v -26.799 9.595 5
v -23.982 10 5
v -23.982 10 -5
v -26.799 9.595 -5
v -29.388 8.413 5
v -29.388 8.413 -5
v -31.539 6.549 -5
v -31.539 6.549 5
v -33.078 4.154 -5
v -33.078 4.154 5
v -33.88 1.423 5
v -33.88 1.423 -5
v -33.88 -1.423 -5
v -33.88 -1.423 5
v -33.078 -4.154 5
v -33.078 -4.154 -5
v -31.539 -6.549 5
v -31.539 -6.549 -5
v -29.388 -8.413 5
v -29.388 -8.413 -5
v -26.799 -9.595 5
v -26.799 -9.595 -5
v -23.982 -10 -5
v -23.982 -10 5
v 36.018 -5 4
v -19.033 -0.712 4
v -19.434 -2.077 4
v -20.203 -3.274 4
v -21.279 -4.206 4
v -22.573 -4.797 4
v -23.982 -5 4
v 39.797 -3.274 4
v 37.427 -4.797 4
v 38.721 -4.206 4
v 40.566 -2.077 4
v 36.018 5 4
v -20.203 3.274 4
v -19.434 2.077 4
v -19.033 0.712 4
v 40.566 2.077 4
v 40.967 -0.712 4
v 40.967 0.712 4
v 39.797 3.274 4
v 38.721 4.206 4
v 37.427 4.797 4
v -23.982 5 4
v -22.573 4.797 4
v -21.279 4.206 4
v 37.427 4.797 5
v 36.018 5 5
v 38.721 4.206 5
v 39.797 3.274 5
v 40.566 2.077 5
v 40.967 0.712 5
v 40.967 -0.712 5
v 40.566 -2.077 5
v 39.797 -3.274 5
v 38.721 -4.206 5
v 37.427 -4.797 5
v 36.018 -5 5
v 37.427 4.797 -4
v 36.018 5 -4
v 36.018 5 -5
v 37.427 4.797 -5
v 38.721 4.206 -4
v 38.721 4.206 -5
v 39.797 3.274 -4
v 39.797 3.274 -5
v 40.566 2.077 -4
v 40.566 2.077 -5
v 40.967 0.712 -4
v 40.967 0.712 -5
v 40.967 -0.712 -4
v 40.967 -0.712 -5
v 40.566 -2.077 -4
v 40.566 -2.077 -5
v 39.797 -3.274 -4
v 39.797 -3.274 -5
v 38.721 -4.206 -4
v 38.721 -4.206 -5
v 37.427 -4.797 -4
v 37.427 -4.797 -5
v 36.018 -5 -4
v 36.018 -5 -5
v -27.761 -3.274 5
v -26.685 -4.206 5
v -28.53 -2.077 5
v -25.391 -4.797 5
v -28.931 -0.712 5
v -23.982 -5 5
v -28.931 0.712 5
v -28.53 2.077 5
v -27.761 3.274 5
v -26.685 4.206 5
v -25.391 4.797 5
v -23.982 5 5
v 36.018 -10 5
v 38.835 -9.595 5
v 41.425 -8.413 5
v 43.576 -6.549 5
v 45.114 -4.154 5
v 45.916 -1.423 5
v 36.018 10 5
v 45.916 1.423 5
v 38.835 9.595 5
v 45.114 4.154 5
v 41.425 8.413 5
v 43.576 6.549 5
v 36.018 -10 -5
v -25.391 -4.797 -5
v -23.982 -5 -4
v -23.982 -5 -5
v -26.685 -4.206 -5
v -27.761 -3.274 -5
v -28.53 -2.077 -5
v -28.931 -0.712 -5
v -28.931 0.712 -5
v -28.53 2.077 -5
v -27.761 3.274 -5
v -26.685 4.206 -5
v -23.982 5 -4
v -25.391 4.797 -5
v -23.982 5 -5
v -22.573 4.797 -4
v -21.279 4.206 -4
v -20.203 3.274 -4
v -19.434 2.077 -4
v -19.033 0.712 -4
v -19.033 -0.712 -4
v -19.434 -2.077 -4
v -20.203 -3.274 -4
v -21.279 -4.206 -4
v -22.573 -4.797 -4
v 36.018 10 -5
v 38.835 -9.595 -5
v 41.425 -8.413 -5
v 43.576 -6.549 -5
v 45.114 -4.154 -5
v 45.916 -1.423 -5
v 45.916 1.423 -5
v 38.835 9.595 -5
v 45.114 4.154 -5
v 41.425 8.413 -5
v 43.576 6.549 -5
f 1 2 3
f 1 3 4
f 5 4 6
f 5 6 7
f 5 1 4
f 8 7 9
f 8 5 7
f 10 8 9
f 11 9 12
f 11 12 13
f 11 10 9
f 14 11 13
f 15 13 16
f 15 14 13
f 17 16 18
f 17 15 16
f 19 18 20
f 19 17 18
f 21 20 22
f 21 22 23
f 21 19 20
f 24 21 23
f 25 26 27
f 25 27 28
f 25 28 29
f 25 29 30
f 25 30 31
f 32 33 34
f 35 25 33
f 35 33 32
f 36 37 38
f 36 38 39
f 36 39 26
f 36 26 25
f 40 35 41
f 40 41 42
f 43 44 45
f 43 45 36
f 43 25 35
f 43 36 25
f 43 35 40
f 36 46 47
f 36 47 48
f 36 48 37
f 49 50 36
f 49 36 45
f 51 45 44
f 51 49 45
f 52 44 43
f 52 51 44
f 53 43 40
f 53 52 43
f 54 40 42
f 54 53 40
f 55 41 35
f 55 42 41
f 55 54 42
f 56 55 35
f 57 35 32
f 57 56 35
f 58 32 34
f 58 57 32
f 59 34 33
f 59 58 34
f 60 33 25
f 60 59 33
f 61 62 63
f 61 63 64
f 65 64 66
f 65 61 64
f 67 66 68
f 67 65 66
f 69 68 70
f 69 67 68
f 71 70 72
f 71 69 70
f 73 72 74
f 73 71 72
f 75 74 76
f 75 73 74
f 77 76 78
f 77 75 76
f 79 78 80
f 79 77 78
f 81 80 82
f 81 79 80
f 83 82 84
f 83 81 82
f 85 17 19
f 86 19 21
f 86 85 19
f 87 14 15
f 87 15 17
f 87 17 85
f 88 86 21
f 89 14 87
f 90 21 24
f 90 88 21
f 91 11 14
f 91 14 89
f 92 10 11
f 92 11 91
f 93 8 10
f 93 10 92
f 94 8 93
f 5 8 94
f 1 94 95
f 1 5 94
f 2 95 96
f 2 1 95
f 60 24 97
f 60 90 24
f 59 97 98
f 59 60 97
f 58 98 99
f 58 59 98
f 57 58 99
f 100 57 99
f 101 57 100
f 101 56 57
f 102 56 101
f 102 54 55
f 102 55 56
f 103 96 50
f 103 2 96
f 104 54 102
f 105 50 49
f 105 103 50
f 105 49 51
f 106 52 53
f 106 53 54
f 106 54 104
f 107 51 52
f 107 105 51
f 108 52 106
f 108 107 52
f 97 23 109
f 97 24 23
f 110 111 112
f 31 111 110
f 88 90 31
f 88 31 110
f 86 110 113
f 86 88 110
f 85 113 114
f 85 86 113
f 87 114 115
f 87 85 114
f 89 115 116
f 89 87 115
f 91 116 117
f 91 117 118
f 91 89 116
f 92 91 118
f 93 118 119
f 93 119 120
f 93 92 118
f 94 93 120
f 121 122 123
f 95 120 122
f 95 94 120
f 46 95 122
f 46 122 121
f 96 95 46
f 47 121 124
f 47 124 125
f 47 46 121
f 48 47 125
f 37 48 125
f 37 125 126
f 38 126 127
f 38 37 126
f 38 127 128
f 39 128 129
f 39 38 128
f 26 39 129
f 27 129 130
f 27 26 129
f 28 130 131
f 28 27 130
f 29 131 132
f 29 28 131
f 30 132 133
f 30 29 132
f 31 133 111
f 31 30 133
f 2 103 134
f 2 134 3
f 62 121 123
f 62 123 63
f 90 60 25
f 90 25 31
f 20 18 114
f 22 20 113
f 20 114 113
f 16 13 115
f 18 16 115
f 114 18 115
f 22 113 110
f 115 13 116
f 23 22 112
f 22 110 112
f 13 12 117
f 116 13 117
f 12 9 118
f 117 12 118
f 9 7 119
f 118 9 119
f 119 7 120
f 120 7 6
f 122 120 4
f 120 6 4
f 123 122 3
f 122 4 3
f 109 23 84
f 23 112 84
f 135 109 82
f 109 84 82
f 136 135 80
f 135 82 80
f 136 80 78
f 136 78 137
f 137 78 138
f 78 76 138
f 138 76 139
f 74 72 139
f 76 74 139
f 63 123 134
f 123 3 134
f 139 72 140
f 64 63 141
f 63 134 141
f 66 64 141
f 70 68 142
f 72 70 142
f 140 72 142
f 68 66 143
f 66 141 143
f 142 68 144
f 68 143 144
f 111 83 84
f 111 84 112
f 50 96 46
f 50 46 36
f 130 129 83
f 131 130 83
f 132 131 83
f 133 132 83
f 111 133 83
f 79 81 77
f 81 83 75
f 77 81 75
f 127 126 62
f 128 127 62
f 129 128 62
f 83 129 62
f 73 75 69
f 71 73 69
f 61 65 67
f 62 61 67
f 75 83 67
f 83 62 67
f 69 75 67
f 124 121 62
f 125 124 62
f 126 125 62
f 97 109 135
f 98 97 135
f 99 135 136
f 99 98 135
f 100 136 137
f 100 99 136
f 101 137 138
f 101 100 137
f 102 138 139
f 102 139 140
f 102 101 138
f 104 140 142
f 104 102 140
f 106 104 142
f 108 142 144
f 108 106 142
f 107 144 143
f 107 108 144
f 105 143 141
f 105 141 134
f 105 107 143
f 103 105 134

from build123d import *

# Parameters (mm, degrees)
F1_DEPTH = 4
F2_DEPTH = 5


with BuildPart() as f1:
    # F0 (on Top) → F1 (new body, symmetric)
    with BuildSketch(Plane.XY):
        with BuildLine():
            Line((-23.981852, -5), (36.018148, -5))
            ThreePointArc((36.018148, -5), (41.018148, 0), (36.018148, 5))
            Line((36.018148, 5), (-23.981852, 5))
            ThreePointArc((-23.981852, 5), (-18.981852, 0), (-23.981852, -5))
        make_face()
    extrude(amount=F1_DEPTH, both=True)

    # F0 (on Top) → F2 (join, symmetric)
    with BuildSketch(Plane.XY):
        with BuildLine():
            Line((-23.981852, -5), (36.018148, -5))
            ThreePointArc((36.018148, -5), (41.018148, 0), (36.018148, 5))
            Line((36.018148, 5), (-23.981852, 5))
            ThreePointArc((-23.981852, 5), (-18.981852, 0), (-23.981852, -5))
        make_face()
        with BuildLine():
            ThreePointArc((36.018148, -10), (46.018148, 0), (36.018148, 10))
            Line((36.018148, 10), (-23.981852, 10))
            ThreePointArc((-23.981852, 10), (-33.981852, 0), (-23.981852, -10))
            Line((-23.981852, -10), (36.018148, -10))
        make_face()
        with BuildLine():
            ThreePointArc((36.018148, 5), (41.018148, 0), (36.018148, -5))
            Line((36.018148, -5), (-23.981852, -5))
            ThreePointArc((-23.981852, -5), (-28.981852, 0), (-23.981852, 5))
            Line((-23.981852, 5), (36.018148, 5))
        make_face(mode=Mode.SUBTRACT)
    extrude(amount=F2_DEPTH, both=True)


solid = f1.part
